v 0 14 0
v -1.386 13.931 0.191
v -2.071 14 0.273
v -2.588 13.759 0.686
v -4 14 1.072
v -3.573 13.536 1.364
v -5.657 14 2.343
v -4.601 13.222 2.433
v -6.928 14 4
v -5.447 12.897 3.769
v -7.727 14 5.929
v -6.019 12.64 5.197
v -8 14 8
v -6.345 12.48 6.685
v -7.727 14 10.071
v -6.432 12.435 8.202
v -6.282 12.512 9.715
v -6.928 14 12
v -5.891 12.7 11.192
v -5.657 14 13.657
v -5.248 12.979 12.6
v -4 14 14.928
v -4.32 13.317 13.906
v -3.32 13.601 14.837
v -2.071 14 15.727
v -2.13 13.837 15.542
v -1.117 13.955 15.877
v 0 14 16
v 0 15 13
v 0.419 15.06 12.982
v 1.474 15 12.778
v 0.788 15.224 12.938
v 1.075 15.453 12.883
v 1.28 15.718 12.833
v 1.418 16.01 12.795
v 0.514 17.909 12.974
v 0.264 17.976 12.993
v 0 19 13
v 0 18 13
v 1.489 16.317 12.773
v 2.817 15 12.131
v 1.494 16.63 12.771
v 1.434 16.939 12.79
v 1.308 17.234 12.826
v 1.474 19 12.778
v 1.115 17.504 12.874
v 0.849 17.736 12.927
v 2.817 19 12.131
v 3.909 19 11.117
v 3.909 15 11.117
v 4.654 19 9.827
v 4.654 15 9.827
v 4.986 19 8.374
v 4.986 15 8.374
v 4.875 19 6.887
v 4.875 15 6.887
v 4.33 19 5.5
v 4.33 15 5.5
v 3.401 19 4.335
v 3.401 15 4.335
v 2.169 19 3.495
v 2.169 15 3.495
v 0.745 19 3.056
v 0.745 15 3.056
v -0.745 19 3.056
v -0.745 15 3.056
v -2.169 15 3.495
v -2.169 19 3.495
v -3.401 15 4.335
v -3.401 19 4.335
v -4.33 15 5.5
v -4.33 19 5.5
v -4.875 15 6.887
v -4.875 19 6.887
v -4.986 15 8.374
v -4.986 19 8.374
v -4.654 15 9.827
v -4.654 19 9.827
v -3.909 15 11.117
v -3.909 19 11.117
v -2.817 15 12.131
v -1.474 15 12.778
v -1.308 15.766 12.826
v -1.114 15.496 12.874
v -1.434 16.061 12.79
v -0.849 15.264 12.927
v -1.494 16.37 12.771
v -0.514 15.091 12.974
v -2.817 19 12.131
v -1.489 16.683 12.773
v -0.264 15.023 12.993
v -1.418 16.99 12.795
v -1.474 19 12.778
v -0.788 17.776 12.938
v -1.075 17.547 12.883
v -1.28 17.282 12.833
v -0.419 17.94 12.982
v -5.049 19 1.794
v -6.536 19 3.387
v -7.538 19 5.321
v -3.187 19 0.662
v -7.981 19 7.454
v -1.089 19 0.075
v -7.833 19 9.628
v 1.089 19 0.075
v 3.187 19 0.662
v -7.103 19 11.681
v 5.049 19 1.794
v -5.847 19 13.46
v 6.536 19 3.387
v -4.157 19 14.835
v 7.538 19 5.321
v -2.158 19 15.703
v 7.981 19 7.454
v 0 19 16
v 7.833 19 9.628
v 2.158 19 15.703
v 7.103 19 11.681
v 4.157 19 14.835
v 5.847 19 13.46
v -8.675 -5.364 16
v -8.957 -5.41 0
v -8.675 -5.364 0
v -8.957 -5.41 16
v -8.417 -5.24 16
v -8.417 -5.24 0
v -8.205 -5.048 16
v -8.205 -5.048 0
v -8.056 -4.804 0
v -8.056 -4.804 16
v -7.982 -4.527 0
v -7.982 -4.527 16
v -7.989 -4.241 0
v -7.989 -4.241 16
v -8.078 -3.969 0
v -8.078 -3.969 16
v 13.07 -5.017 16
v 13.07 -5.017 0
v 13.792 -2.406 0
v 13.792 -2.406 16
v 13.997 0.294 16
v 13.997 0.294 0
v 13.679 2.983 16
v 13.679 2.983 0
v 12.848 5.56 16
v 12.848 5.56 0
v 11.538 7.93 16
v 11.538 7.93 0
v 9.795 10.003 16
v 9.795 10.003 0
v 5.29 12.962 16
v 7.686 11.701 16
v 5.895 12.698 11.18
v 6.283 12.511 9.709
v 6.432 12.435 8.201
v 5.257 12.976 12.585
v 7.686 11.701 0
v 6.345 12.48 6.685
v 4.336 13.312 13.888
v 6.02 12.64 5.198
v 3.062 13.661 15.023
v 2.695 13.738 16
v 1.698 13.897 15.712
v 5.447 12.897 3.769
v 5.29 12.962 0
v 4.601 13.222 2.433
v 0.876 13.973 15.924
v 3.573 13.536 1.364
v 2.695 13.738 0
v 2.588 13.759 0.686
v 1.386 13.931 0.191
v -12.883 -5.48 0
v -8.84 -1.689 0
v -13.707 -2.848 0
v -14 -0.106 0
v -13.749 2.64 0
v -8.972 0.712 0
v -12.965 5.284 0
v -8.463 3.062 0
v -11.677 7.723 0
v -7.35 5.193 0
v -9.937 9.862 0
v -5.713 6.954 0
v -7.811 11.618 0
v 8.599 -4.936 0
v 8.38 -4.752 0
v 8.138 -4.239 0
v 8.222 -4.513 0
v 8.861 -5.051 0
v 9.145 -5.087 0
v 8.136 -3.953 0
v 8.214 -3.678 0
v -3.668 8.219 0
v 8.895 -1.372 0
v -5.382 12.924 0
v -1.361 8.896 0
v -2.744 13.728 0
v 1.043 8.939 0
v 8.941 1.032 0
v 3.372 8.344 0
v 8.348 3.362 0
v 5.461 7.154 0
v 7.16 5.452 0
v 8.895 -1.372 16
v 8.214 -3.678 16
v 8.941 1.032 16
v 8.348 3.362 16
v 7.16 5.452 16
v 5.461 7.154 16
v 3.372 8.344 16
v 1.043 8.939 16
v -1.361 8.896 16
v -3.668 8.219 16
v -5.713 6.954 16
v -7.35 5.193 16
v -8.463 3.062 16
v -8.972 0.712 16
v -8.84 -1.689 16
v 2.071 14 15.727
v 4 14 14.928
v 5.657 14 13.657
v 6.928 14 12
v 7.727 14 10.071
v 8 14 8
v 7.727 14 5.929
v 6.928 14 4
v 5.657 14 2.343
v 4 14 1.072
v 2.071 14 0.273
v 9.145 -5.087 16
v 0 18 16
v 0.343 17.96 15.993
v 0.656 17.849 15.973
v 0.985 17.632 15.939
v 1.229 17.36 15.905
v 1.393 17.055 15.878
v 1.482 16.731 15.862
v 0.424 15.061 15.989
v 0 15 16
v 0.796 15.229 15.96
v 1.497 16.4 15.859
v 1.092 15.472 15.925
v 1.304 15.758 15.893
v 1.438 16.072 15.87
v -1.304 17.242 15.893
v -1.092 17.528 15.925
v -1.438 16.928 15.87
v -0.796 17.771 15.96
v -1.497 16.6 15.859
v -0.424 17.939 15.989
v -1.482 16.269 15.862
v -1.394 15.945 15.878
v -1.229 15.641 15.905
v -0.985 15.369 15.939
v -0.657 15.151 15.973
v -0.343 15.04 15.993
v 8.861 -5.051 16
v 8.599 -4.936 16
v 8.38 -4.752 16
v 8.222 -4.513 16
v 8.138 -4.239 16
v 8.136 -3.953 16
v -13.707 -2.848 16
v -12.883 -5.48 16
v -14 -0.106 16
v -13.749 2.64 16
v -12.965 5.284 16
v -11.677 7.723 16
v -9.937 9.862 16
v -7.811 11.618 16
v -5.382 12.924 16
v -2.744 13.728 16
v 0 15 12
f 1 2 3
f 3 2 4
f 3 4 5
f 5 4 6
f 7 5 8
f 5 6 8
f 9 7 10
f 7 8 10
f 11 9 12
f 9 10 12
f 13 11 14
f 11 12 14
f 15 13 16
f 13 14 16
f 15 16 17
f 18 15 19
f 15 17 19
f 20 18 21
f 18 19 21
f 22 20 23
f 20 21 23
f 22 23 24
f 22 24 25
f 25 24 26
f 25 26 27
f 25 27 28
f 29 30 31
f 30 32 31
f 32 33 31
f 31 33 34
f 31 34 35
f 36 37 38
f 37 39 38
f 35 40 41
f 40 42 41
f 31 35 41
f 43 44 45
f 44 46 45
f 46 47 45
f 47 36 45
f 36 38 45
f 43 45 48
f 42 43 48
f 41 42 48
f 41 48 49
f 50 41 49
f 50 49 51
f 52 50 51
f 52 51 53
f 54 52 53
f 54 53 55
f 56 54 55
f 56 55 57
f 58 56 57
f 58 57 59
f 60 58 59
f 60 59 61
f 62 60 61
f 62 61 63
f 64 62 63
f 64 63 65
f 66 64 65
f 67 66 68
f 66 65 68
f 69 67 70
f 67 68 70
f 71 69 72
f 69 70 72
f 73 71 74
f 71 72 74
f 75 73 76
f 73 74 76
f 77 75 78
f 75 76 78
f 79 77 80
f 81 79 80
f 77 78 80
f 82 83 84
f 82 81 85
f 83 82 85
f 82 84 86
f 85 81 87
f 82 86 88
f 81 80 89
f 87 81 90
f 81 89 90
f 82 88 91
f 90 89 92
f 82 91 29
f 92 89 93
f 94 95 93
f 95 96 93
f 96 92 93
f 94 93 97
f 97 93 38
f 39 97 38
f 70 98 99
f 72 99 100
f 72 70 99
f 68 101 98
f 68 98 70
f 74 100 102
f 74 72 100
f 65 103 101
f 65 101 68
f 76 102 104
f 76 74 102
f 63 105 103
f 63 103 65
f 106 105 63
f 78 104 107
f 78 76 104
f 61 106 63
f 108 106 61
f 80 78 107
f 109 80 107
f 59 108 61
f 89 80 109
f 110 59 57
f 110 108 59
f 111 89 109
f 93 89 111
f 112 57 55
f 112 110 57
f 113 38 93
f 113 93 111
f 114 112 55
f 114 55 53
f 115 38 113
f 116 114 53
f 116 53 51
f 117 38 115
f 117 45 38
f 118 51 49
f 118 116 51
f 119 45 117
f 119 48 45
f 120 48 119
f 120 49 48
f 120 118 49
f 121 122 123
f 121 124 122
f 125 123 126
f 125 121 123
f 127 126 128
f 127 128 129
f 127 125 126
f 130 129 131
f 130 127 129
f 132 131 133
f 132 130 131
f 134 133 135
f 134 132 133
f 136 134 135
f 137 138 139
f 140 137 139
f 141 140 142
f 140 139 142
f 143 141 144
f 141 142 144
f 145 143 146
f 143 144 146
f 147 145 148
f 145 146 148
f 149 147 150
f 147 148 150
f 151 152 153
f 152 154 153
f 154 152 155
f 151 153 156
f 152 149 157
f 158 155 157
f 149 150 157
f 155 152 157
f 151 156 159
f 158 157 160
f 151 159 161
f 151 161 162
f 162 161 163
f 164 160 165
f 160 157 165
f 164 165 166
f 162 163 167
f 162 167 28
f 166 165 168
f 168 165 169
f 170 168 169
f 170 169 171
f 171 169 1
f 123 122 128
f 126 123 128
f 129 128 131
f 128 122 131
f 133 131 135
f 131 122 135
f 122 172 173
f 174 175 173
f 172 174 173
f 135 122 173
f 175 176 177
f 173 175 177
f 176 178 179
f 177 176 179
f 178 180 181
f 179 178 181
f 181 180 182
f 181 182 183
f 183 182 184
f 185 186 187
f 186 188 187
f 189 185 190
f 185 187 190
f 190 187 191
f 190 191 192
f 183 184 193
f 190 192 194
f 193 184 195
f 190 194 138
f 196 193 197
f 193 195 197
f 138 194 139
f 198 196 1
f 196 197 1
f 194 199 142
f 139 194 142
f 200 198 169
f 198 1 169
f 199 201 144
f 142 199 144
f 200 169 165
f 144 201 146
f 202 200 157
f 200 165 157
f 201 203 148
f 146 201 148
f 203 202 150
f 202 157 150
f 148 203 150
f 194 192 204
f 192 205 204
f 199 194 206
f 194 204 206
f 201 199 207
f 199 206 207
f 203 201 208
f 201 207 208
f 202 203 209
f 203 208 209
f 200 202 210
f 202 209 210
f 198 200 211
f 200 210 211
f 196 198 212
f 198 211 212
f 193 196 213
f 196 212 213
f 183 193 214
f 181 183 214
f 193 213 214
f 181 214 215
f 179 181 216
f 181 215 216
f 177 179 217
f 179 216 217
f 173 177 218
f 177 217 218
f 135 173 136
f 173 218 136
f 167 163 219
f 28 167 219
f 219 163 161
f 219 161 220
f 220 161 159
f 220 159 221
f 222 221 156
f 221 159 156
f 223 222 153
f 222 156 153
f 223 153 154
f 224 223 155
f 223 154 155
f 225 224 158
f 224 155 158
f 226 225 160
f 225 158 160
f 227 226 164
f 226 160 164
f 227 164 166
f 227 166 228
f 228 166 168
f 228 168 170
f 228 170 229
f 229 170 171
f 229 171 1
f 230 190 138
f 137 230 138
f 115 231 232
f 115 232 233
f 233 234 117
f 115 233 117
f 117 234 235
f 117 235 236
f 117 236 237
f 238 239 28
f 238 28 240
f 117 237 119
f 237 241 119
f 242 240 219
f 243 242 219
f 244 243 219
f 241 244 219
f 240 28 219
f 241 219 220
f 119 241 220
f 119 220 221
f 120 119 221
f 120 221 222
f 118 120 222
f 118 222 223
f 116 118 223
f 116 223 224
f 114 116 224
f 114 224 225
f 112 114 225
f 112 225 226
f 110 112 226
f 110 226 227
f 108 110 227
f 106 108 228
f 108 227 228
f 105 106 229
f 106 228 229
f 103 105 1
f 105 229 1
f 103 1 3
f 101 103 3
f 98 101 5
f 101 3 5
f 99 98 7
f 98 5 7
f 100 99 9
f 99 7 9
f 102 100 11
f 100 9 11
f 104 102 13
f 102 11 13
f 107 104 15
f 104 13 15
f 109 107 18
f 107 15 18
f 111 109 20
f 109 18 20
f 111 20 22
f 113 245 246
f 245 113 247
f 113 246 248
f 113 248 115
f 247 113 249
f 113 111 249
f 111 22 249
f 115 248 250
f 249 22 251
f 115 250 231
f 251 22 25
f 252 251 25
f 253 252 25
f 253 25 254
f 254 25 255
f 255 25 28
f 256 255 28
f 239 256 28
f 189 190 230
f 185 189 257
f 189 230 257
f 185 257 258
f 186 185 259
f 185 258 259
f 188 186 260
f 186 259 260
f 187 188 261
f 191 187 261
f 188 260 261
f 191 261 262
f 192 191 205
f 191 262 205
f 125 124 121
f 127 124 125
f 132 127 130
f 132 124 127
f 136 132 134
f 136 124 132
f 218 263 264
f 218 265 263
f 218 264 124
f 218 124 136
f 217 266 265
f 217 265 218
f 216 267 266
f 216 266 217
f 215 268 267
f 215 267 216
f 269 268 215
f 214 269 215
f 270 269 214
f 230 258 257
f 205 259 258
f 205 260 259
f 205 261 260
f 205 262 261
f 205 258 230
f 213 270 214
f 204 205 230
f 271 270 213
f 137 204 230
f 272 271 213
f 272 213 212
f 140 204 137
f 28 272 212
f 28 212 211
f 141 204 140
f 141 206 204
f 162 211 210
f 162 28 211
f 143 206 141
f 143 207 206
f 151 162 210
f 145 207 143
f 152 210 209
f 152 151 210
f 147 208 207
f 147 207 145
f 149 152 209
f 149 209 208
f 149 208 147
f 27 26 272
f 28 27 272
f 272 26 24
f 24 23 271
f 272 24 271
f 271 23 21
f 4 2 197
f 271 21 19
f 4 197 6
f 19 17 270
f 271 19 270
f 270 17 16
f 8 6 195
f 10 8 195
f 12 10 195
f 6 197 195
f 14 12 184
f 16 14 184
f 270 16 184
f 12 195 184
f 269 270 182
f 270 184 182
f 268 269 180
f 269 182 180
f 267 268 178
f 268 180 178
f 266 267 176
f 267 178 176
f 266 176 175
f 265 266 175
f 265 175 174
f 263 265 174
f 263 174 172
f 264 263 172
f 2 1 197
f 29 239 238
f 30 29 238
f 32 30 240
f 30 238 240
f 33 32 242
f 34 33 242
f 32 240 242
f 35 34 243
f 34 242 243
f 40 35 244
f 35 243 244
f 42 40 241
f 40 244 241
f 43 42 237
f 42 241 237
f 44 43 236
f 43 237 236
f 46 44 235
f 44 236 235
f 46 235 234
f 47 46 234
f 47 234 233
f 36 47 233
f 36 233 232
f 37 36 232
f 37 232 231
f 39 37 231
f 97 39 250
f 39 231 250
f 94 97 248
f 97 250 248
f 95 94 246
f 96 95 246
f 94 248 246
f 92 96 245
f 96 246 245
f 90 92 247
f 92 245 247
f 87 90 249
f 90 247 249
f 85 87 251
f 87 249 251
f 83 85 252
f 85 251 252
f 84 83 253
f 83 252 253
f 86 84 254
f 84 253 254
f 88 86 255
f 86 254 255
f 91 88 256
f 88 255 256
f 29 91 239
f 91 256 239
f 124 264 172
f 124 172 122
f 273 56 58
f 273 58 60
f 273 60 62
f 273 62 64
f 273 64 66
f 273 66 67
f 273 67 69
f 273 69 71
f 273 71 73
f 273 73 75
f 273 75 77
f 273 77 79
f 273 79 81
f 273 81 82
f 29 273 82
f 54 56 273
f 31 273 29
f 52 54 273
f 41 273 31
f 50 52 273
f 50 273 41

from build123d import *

# Parameters (mm, degrees)
SKETCH1_R           = 14
BOSS_EXTRUDE1_DEPTH = 16
CUT_EXTRUDE1_REACH  = 27.456
SKETCH2_R           = 9
CUT_EXTRUDE2_DEPTH  = 26.455844123
BOSS_EXTRUDE2_START = 11
SKETCH4_R           = 5
BOSS_EXTRUDE2_DEPTH = 3
BOSS_EXTRUDE2_DRAFT = -45
SKETCH5_R           = 8
BOSS_EXTRUDE3_DEPTH = 5
SKETCH6_R           = 5
CUT_EXTRUDE3_DEPTH  = 4
CUT_EXTRUDE4_START  = 17
SKETCH7_R           = 1.5
CUT_EXTRUDE4_DEPTH  = 5
FILLET1_R           = 1


with BuildPart() as part:
    # Sketch1 → Boss-Extrude1 (new body)
    with BuildSketch(Plane.XY):
        Circle(SKETCH1_R)
    extrude(amount=BOSS_EXTRUDE1_DEPTH)

    # Sketch2 → Cut-Extrude1 (cut, up to next)
    with BuildSketch(Plane.XY.offset(16), mode=Mode.PRIVATE) as cut_extrude1_sk1:
        Circle(SKETCH2_R)
    cut_extrude1_tool1 = extrude(cut_extrude1_sk1.sketch, amount=-CUT_EXTRUDE1_REACH, mode=Mode.PRIVATE) & part.part
    add(cut_extrude1_tool1.solids().sort_by_distance((0, 0, 16))[0], mode=Mode.SUBTRACT)

    # Sketch3 → Cut-Extrude2 (cut, through all)
    with BuildSketch(Plane.XY.offset(16)):
        Polygon((-14, -5.5), (14, -5), (14, -14), (-14, -14), align=None)
    extrude(amount=-CUT_EXTRUDE2_DEPTH, mode=Mode.SUBTRACT)


with BuildPart() as boss_extrude2_tool:
    # Sketch4 → Boss-Extrude2 (with draft: the straight prism first)
    with BuildSketch(Plane(origin=(0, 0, 0), x_dir=(-1, 0, 0), z_dir=(0, 1, 0)).offset(BOSS_EXTRUDE2_START)):
        with Locations((0, 8)):
            Circle(SKETCH4_R)
    extrude(amount=BOSS_EXTRUDE2_DEPTH)
    # Boss-Extrude2: the draft: its side faces are tilted about the plane it starts from
    boss_extrude2_sides = [boss_extrude2_tool.faces().sort_by_distance(p)[0] for p in [
        (5, 12.5, 8),
    ]]
    draft(boss_extrude2_sides, Plane(origin=(0, 0, 0), x_dir=(-1, 0, 0), z_dir=(0, 1, 0)).offset(BOSS_EXTRUDE2_START), BOSS_EXTRUDE2_DRAFT)


with BuildPart() as part_1:
    add(part.part)

    # Boss-Extrude2: add boss_extrude2_tool
    add(boss_extrude2_tool.part)

    # Sketch5 → Boss-Extrude3 (add)
    with BuildSketch(Plane(origin=(0, 14, 0), x_dir=(1, 0, 0), z_dir=(0, 1, 0))):
        with Locations(Location((0, -8, 0), (0, 0, 270))):
            Circle(SKETCH5_R)
    extrude(amount=BOSS_EXTRUDE3_DEPTH)

    # Sketch6 → Cut-Extrude3 (cut)
    with BuildSketch(Plane(origin=(0, 19, 0), x_dir=(1, 0, 0), z_dir=(0, 1, 0))):
        with Locations(Location((0, -8, 0), (0, 0, 270))):
            Circle(SKETCH6_R)
    extrude(amount=-CUT_EXTRUDE3_DEPTH, mode=Mode.SUBTRACT)

    # Sketch7 → Cut-Extrude4 (cut)
    with BuildSketch(Plane.XY.offset(CUT_EXTRUDE4_START)):
        with Locations(Location((0, 16.5, 0), (0, 0, 270))):
            Circle(SKETCH7_R)
    extrude(amount=-CUT_EXTRUDE4_DEPTH, mode=Mode.SUBTRACT)

    # Fillet1
    fillet1_edges = [part_1.edges().sort_by_distance(p)[0] for p in [
        (7.403251486, -5.117799081, 8),
        (-7.215811257, -5.378853772, 8),
    ]]
    fillet(fillet1_edges, radius=FILLET1_R)


solid = part_1.part
